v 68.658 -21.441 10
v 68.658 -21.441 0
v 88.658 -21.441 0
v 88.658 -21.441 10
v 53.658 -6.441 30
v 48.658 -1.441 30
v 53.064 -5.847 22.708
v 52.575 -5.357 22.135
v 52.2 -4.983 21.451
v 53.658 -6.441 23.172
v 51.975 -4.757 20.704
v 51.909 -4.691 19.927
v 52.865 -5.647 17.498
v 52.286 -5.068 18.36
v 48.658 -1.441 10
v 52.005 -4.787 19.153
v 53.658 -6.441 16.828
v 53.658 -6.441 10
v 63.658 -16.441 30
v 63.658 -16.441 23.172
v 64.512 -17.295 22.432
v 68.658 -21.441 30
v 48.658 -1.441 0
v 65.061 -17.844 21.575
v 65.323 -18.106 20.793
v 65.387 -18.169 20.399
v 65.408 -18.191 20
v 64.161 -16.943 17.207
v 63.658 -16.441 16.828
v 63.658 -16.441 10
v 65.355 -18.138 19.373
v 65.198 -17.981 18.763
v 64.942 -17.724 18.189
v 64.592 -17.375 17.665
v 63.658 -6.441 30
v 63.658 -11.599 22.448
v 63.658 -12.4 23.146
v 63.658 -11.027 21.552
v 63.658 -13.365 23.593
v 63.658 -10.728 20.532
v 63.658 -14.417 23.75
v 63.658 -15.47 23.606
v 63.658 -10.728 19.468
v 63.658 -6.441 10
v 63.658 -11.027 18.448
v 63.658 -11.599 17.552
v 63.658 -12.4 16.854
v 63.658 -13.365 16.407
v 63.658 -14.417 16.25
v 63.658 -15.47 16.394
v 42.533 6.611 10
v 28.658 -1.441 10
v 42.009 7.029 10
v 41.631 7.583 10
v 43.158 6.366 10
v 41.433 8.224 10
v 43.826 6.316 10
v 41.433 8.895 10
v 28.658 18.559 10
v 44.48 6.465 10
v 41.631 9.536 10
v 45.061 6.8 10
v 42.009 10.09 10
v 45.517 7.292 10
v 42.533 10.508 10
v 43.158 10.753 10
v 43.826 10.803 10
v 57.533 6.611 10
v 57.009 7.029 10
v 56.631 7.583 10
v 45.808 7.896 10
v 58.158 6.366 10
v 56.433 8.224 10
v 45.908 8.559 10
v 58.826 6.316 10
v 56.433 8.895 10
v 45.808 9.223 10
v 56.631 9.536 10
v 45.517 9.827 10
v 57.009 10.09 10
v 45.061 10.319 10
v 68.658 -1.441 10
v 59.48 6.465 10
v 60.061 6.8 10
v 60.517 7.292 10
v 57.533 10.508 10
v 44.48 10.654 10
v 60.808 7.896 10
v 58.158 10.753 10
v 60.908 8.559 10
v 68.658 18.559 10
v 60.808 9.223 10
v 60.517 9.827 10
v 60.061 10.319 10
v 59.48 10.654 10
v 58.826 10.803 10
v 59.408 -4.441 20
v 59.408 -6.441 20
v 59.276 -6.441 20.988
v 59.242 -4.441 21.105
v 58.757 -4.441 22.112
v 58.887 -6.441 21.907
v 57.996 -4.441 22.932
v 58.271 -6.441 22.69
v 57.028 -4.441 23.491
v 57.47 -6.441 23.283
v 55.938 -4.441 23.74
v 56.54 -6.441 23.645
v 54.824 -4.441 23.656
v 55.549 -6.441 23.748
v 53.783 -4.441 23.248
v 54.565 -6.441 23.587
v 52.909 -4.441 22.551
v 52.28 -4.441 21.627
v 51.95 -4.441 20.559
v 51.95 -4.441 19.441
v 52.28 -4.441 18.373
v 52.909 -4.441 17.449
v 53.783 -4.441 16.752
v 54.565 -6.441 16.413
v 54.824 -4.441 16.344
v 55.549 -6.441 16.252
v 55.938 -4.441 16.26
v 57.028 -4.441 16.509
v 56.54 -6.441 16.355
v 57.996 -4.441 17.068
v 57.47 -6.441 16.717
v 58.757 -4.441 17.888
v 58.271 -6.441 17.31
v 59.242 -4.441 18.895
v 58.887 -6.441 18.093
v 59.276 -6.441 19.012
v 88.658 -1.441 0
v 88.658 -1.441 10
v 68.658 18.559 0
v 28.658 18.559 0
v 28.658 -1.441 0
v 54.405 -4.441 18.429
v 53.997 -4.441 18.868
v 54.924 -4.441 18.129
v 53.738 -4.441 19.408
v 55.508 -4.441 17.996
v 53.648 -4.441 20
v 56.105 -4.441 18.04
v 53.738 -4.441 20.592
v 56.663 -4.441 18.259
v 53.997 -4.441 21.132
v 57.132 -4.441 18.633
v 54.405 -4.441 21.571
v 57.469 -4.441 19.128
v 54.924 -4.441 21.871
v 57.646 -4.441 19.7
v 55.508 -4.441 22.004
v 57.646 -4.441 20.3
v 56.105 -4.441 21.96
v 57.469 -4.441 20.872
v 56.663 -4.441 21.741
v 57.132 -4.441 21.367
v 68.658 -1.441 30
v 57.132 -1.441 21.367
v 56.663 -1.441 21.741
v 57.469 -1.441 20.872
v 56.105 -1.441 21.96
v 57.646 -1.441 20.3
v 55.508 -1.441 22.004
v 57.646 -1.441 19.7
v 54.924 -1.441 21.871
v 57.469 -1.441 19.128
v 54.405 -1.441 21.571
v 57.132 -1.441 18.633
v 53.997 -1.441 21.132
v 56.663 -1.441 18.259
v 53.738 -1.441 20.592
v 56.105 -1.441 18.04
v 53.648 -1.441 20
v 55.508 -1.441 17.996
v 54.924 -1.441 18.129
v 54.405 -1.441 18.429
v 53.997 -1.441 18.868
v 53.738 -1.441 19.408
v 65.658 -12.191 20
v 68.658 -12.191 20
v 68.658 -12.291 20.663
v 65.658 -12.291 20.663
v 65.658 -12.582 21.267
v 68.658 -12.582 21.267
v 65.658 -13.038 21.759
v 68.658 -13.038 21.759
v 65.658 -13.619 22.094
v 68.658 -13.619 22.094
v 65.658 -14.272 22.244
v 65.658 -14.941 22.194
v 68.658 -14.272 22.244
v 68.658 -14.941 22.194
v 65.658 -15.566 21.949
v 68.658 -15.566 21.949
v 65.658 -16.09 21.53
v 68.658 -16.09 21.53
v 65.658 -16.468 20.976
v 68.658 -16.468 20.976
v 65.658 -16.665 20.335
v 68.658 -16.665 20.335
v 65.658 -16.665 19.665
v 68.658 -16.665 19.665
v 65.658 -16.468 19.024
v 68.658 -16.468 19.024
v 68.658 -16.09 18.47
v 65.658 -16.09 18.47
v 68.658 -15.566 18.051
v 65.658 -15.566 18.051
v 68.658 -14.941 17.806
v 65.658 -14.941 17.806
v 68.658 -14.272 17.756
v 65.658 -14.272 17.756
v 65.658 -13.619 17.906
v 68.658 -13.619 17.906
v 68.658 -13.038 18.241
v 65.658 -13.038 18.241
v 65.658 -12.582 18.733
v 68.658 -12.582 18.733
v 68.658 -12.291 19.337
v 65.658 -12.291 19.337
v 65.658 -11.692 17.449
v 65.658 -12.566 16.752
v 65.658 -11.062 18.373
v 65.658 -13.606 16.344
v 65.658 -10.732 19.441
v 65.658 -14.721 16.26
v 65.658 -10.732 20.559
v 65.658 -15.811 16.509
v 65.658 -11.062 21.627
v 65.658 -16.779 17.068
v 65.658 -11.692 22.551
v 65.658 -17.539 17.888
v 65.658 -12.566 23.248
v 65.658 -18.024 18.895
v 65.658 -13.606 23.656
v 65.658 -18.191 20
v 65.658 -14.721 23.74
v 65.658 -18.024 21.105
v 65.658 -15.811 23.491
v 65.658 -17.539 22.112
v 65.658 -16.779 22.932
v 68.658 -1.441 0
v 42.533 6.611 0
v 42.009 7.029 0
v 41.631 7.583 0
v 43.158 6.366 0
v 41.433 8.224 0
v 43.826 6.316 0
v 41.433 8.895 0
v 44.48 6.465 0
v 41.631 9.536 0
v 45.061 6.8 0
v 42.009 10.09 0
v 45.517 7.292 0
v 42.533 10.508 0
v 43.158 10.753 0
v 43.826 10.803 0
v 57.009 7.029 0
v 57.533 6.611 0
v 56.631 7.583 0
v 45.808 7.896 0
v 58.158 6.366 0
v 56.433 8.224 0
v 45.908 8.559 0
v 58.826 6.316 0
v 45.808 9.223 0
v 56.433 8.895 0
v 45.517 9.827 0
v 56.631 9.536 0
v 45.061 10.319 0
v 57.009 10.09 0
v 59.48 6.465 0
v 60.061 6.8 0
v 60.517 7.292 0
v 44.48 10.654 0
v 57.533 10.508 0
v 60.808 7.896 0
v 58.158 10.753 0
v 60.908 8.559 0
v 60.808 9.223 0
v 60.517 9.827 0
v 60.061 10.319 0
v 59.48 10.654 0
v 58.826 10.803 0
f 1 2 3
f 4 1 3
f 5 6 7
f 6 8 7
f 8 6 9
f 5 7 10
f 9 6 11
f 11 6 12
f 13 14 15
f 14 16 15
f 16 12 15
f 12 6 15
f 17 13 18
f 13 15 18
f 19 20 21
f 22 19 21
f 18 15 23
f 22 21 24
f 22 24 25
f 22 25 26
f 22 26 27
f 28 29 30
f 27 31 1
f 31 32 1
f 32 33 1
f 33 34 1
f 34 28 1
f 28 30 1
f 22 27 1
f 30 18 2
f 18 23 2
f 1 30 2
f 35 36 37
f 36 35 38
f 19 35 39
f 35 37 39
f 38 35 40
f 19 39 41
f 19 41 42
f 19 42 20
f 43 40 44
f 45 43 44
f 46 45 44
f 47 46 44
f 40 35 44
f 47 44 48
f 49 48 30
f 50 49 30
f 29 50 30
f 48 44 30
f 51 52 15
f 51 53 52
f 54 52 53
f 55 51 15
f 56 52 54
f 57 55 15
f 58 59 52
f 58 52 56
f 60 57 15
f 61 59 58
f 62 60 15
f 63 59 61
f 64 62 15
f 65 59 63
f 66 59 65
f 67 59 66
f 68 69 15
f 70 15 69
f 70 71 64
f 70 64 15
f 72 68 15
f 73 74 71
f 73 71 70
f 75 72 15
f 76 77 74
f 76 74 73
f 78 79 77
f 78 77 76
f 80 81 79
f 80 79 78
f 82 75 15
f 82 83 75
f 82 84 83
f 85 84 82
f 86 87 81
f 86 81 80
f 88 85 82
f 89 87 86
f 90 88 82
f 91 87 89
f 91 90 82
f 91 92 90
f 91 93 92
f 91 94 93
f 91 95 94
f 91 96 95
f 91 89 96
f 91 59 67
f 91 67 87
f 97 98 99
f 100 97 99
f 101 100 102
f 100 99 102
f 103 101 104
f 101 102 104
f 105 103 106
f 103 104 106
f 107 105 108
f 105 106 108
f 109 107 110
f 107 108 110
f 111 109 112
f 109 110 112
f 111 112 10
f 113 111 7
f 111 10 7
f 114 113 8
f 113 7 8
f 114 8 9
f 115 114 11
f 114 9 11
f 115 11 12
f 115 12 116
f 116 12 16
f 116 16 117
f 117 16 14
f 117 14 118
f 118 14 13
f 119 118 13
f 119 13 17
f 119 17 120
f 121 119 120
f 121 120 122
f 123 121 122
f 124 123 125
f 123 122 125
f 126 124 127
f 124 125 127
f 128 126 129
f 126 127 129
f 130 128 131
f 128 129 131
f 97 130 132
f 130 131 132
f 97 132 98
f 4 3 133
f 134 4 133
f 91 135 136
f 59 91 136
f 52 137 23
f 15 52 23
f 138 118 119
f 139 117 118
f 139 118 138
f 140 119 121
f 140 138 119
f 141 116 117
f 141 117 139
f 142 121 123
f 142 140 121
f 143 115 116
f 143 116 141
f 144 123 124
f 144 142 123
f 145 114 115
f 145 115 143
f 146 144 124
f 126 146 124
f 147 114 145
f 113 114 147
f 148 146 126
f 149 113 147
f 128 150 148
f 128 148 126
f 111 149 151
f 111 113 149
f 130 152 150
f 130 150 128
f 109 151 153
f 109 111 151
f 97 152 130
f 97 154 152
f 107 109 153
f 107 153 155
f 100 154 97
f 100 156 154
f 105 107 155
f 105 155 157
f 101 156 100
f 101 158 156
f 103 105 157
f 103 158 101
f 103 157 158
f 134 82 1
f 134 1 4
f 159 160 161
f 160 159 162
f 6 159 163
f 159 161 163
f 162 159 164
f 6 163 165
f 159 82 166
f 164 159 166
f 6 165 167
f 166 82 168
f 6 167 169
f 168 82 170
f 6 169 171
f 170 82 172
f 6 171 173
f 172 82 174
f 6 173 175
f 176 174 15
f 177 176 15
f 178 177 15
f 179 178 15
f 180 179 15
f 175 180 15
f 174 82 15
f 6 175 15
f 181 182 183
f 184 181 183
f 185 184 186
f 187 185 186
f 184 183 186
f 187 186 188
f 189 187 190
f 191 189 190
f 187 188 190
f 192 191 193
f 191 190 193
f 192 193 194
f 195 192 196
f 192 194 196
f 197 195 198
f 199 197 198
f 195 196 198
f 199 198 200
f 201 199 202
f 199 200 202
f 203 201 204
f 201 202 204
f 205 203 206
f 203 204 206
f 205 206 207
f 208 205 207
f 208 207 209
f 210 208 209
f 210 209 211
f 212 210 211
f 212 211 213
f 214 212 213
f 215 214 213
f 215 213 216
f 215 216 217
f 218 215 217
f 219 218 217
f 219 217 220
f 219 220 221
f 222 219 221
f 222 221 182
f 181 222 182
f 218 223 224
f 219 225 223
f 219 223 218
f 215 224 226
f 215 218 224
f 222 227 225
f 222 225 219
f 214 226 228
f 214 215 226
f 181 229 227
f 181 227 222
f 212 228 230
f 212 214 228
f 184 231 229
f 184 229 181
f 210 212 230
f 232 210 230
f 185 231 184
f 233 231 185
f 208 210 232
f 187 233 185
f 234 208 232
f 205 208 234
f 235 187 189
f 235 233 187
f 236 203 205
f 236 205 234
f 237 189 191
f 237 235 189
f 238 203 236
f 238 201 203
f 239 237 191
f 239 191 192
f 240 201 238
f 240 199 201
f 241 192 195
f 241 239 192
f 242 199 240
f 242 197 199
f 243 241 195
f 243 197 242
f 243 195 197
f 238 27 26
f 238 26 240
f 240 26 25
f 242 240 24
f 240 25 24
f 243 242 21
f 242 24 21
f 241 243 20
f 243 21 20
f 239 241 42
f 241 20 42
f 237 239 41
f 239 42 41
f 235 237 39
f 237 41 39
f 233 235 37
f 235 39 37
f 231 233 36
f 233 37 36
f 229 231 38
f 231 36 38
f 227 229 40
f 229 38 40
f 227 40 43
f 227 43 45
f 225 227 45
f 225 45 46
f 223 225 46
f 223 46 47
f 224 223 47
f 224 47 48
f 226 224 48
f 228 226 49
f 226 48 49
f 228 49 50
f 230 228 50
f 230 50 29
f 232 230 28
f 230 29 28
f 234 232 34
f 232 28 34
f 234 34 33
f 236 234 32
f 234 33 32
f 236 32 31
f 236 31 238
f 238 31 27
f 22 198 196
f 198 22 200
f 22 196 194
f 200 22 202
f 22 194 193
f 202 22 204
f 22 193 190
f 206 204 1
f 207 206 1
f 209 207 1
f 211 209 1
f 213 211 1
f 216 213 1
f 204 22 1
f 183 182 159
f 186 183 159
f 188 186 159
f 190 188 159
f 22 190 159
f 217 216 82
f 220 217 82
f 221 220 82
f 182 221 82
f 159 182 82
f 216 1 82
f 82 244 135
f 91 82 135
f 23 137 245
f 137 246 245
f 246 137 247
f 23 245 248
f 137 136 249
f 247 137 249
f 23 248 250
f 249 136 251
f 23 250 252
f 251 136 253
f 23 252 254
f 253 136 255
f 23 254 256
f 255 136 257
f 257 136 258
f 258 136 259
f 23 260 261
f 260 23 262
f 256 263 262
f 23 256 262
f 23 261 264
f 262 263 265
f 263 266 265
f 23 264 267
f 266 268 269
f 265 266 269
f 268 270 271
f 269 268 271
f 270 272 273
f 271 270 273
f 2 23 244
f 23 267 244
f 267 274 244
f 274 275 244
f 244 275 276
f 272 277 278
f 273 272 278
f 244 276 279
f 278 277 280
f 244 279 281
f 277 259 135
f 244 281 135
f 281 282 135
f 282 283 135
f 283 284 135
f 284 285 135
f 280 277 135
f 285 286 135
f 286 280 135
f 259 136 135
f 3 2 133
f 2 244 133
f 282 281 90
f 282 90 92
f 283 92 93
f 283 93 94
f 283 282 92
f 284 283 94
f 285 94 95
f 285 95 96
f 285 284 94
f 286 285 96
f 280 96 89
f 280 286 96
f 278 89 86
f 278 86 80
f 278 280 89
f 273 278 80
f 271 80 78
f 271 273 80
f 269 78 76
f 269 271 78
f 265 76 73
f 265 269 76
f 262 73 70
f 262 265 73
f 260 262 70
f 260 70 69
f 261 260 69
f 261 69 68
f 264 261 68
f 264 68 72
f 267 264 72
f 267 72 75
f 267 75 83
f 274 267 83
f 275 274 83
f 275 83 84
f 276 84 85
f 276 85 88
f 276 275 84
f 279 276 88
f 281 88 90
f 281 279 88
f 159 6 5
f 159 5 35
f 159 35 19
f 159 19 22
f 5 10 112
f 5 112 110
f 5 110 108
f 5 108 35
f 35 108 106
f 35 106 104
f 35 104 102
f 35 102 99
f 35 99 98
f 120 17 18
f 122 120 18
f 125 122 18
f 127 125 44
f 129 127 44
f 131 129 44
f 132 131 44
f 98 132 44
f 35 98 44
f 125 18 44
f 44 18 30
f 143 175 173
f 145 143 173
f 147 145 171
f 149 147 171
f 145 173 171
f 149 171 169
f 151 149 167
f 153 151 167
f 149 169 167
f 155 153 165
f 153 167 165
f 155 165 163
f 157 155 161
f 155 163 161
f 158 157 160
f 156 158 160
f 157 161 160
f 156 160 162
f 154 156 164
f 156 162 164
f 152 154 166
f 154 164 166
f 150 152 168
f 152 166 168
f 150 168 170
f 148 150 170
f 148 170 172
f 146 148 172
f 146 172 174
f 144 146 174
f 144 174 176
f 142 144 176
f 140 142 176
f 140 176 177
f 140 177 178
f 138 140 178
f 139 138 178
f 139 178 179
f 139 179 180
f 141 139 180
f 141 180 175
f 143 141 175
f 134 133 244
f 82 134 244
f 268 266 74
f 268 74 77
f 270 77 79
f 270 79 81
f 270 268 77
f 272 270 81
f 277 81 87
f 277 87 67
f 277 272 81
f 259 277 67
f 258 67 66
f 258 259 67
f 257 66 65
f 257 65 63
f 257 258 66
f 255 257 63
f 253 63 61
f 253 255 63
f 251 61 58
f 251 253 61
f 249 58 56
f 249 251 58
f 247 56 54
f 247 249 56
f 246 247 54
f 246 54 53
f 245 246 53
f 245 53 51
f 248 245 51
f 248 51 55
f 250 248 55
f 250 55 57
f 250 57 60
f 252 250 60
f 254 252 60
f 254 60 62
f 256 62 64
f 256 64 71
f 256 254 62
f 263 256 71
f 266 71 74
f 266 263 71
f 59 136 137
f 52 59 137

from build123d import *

# Parameters (mm, degrees)
F0_R      = 2.25
F1_DEPTH  = 10
F3_DEPTH  = 20
F4_R      = 2.25
F5_DEPTH  = 5
F6_R      = 2.01
F7_DEPTH  = 5
F8_R      = 3.75
F9_DEPTH  = 2
F10_R     = 3.75
F11_DEPTH = 2


with BuildPart() as f1:
    # F0 (on Top) → F1 (new body)
    with BuildSketch(Plane.XY):
        Polygon((28.65822, 18.559446), (28.65822, -1.440554), (48.65822, -1.440554), (68.65822, -21.440554), (88.65822, -21.440554), (88.65822, -1.440554), (68.65822, -1.440554), (68.65822, 18.559446), align=None)
        with Locations((43.65822, 8.559446)):
            Circle(F0_R, mode=Mode.SUBTRACT)
        with Locations((58.65822, 8.559446)):
            Circle(F0_R, mode=Mode.SUBTRACT)
    extrude(amount=F1_DEPTH)

    # F2 (on face) → F3 (join)
    with BuildSketch(Plane.XY.offset(10)):
        Polygon((68.65822, -21.440554), (68.65822, -1.440554), (48.65822, -1.440554), (53.65822, -6.440554), (58.65822, -6.440554), (63.65822, -6.440554), (63.65822, -11.440554), (63.65822, -16.440554), align=None)
    extrude(amount=F3_DEPTH)

    # F4 (on face) → F5 (cut)
    with BuildSketch(Plane.YZ.offset(68.65822)):
        with Locations((-14.440554, 20)):
            Circle(F4_R)
    extrude(amount=-F5_DEPTH, mode=Mode.SUBTRACT)

    # F6 (on face) → F7 (cut)
    with BuildSketch(Plane(origin=(0, -1.440554, 0), x_dir=(-1, 0, 0), z_dir=(0, 1, 0))):
        with Locations((-55.65822, 20)):
            Circle(F6_R)
    extrude(amount=-F7_DEPTH, mode=Mode.SUBTRACT)

    # F8 (on face) → F9 (cut)
    with BuildSketch(Plane(origin=(63.65822, 0, 0), x_dir=(0, -1, 0), z_dir=(-1, 0, 0))):
        with Locations((14.440554, 20)):
            Circle(F8_R)
    extrude(amount=-F9_DEPTH, mode=Mode.SUBTRACT)

    # F10 (on face) → F11 (cut)
    with BuildSketch(Plane.XZ.offset(6.440554)):
        with Locations((55.65822, 20)):
            Circle(F10_R)
    extrude(amount=-F11_DEPTH, mode=Mode.SUBTRACT)


solid = f1.part
